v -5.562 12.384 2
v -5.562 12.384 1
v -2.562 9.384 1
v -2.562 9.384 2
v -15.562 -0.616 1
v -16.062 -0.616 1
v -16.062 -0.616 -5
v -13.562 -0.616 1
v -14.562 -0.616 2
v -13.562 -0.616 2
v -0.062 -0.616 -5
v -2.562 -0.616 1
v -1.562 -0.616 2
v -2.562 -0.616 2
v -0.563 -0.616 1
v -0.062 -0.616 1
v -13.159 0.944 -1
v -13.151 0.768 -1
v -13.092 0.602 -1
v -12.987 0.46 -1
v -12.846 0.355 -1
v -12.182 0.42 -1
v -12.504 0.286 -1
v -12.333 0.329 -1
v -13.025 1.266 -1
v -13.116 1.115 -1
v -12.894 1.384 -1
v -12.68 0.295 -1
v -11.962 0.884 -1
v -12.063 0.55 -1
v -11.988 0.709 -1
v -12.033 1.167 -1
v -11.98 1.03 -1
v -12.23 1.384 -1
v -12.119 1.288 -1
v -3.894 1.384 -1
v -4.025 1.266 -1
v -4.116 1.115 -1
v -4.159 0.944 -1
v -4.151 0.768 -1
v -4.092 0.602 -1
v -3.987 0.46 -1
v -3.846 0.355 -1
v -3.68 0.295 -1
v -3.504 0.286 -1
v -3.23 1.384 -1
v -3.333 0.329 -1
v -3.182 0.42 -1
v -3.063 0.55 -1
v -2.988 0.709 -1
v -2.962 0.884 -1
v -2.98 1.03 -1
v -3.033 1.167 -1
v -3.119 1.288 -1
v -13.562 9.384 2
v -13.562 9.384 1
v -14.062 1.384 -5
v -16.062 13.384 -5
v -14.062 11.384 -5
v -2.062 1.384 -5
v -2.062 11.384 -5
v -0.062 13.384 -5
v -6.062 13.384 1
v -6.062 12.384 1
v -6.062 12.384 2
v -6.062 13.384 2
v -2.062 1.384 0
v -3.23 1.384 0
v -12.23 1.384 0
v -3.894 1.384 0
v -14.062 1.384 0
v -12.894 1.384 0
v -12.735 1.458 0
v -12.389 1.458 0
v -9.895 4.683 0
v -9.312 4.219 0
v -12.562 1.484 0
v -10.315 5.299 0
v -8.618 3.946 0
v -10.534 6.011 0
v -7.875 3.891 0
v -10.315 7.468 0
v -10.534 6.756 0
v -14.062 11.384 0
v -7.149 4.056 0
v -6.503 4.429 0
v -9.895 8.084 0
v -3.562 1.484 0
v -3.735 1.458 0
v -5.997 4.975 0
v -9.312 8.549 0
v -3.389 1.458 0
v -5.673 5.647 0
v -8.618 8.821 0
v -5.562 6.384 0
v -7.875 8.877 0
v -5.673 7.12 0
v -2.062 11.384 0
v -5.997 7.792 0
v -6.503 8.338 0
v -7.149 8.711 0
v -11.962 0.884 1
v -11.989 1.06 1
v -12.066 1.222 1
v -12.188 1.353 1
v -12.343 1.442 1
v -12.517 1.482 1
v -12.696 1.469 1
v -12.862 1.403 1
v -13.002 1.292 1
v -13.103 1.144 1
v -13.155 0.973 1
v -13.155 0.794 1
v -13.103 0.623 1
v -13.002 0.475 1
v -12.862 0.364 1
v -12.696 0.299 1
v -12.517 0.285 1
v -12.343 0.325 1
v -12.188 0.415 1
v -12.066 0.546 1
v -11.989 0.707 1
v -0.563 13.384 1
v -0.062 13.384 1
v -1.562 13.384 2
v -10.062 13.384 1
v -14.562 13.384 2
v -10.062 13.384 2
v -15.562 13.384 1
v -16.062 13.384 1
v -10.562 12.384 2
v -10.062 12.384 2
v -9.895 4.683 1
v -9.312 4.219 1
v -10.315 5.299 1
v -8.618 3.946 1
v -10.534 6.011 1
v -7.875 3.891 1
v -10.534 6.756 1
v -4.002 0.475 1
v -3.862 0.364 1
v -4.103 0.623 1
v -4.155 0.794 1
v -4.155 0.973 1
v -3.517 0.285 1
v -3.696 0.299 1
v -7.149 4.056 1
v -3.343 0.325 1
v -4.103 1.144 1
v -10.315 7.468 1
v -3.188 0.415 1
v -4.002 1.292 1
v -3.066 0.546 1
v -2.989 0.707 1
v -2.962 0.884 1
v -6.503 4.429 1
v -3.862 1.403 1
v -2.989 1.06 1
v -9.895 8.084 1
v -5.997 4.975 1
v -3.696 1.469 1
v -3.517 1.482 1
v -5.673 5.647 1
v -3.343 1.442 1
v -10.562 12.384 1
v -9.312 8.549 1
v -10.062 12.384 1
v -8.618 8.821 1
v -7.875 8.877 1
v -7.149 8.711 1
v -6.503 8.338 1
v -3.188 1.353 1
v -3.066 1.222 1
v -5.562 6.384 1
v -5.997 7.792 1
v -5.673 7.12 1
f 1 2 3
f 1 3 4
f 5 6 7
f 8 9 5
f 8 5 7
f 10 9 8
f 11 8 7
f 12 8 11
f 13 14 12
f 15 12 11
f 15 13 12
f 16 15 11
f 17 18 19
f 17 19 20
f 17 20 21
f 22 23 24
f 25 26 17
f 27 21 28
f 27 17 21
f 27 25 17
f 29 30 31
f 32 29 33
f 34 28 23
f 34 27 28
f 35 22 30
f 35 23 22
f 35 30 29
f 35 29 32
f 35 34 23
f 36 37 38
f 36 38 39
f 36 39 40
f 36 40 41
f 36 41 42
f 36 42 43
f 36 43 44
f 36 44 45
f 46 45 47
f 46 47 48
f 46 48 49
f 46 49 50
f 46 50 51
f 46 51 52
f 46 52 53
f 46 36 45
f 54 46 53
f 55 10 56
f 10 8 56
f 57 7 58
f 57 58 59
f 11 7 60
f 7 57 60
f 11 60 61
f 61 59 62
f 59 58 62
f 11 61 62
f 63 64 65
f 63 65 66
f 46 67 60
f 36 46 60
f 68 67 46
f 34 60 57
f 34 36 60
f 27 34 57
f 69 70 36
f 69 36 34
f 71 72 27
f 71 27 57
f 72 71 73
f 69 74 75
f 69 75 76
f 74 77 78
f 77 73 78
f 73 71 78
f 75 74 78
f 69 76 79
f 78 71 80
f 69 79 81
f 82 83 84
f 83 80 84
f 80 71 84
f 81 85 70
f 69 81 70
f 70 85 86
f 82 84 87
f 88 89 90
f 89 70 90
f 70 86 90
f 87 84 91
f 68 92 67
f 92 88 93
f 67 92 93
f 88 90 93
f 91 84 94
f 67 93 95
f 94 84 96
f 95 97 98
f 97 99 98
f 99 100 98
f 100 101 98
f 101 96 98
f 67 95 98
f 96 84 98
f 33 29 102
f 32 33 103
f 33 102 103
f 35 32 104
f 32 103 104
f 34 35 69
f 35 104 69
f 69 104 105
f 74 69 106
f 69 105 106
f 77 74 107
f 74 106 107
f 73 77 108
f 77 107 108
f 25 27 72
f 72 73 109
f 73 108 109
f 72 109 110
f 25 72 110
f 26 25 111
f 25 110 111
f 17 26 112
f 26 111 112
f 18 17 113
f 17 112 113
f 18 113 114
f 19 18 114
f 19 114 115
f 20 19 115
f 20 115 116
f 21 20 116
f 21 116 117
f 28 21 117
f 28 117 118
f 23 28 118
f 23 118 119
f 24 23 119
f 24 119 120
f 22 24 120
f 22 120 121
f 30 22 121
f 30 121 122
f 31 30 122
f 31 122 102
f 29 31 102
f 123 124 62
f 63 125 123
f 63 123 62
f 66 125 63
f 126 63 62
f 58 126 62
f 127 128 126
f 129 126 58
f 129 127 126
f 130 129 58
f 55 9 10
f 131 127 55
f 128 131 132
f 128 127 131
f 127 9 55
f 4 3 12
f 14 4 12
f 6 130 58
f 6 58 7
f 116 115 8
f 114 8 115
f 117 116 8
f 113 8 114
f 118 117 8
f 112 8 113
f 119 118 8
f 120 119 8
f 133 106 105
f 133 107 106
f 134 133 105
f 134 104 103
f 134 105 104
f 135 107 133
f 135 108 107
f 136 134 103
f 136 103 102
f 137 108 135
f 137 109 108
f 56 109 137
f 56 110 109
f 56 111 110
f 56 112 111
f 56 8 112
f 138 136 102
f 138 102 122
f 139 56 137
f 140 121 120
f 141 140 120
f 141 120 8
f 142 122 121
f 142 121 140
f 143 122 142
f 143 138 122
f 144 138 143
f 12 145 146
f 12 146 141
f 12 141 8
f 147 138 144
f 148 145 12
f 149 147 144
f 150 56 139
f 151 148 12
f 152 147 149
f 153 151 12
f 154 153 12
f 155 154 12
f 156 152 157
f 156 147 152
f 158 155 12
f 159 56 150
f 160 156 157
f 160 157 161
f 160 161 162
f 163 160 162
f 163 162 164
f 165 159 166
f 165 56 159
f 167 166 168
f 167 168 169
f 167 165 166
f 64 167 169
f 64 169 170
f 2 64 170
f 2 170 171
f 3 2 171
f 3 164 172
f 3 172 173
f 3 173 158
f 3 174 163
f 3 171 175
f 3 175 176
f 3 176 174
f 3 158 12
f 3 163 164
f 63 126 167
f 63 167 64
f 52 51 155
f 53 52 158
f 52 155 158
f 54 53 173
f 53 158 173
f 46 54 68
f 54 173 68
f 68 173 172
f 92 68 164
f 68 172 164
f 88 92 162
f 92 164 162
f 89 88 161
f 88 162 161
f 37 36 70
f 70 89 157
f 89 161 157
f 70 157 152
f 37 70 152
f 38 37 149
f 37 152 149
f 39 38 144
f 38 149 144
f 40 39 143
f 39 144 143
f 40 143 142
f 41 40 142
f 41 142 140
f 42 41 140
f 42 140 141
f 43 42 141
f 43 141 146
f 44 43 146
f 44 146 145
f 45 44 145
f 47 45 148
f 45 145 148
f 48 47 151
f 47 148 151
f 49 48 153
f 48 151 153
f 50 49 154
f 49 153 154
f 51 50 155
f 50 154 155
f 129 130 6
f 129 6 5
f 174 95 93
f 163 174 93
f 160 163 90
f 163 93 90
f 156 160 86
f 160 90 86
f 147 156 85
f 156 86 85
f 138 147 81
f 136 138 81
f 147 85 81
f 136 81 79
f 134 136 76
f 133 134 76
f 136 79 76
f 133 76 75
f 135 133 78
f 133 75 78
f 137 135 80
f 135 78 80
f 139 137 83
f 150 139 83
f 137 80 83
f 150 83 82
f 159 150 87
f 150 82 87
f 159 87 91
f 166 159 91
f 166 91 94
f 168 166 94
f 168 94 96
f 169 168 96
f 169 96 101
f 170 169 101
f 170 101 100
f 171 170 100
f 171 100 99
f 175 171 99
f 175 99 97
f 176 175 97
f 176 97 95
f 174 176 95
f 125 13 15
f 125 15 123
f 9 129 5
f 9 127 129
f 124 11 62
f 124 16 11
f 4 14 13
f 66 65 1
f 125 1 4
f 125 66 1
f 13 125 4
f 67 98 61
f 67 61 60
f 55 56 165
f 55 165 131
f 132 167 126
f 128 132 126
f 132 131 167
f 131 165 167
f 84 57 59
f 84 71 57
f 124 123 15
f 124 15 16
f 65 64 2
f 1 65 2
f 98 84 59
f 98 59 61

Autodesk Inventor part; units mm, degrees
ref_plane "YZ Plane" through (0, 0, 0) normal (1, 0, 0) x (0, 1, 0)
ref_plane "XZ Plane" through (0, 0, 0) normal (0, 1, 0) x (-1, 0, 0)
ref_plane "XY Plane" through (0, 0, 0) normal (0, 0, 1) x (1, 0, 0)
sketch "Sketch1" plane through (0, 0, 0) normal (0, 0, 1) x (1, 0, 0)
  line L0 (-14.0621, 11.3836) -> (-2.0621, 11.3836)
  line L1 (-2.0621, 11.3836) -> (-2.0621, 1.3836)
  line L2 (-2.0621, 1.3836) -> (-14.0621, 1.3836)
  line L3 (-14.0621, 1.3836) -> (-14.0621, 11.3836)
  line L4 (-0.0621, 13.3836) -> (-16.0621, 13.3836)
  line L5 (-16.0621, 13.3836) -> (-16.0621, -0.6164)
  line L6 (-16.0621, -0.6164) -> (-0.0621, -0.6164)
  line L7 (-0.0621, -0.6164) -> (-0.0621, 13.3836)
  point P0 (0, 0)
  dimension "d0" = 12
  dimension "d1" = 10
  dimension "d2" = 2
extrude "Extrusion1" add sketch "Sketch1" against normal blind 5
sketch "Sketch2" plane through (0, 0, 0) normal (0, 0, 1) x (1, 0, 0)
  line L0 (-0.0621, 13.3836) -> (-16.0621, 13.3836) projected
  line L1 (-0.0621, -0.6164) -> (-0.0621, 13.3836) projected
  line L2 (-16.0621, 13.3836) -> (-0.0621, 13.3836)
  line L3 (-0.0621, 13.3836) -> (-0.0621, -0.6164)
  line L4 (-0.0621, -0.6164) -> (-16.0621, -0.6164)
  line L5 (-16.0621, -0.6164) -> (-16.0621, 13.3836)
  line L6 (-0.0621, 13.3836) -> (-0.0621, -0.6164) projected
  line L7 (-0.0621, 6.3836) -> (-16.0621, 6.3836)
  line L8 (-16.0621, -0.6164) -> (-16.0621, 13.3836) projected
  circle A0 centre (-8.0621, 6.3836) radius 2.5
  point P0 (0, 0)
  dimension "d7" = 5
extrude "Extrusion2" add sketch "Sketch2" along normal blind 1 contours L1 L7 A0 L5 L0 | L1 L4 L5 L7 A0
sketch "Sketch3" plane through (0, 0, 1) normal (0, 0, 1) x (1, 0, 0)
  line L0 (-13.5621, 12.3836) -> (-2.5621, 12.3836)
  line L1 (-2.5621, 12.3836) -> (-2.5621, 0.3836)
  line L2 (-2.5621, 0.3836) -> (-13.5621, 0.3836)
  line L3 (-13.5621, 0.3836) -> (-13.5621, 12.3836)
  line L4 (-8.0621, 12.3836) -> (-8.0621, 0.3836)
  circle A0 centre (-8.0621, 6.3836) radius 2.5 projected
  line L5 (-1.5621, 13.3836) -> (-14.5621, 13.3836)
  line L6 (-14.5621, 13.3836) -> (-14.5621, -0.6164)
  line L7 (-14.5621, -0.6164) -> (-1.5621, -0.6164)
  line L8 (-1.5621, -0.6164) -> (-1.5621, 13.3836)
  line L9 (-8.0621, 12.3836) -> (-10.0621, 12.3836)
  line L10 (-10.0621, 12.3836) -> (-10.0621, 13.3836)
  line L11 (-16.0621, 13.3836) -> (-0.0621, 13.3836) projected
  line L12 (-8.0621, 12.3836) -> (-6.0621, 12.3836)
  line L13 (-6.0621, 12.3836) -> (-6.0621, 13.3836)
  line L14 (-8.0621, 0.3836) -> (-4.0621, 0.3836)
  line L15 (-4.0621, 0.3836) -> (-4.0621, -0.6164)
  line L16 (-0.0621, -0.6164) -> (-16.0621, -0.6164) projected
  line L17 (-8.0621, 0.3836) -> (-12.0621, 0.3836)
  line L18 (-12.0621, 0.3836) -> (-12.0621, -0.6164)
  line L19 (-13.5621, 0.3836) -> (-13.5621, -0.6164)
  line L20 (-2.5621, 0.3836) -> (-2.5621, -0.6164)
  point P0 (0, 0)
  dimension "d8" = 11
  dimension "d9" = 12
  dimension "d10" = 1
  dimension "d11" = 2
  dimension "d12" = 2
  dimension "d13" = 4
  dimension "d14" = 4
extrude "Extrusion3" add sketch "Sketch3" along normal blind 1 contours L3 L19 L7 L6 L5 L10 L0 | L13 L5 L8 L7 L20 L1 L0
chamfer "Chamfer1" distance 1 angle 45 2 edges at (-14.5621, 6.3836, 1) (-1.5621, 6.3836, 1)
chamfer "Chamfer2" distance 3 angle 45 2 edges at (-13.5621, 12.3836, 1.5) (-2.5621, 12.3836, 1.5)
sketch "Sketch4" plane through (0, 0, 1) normal (0, 0, 1) x (1, 0, 0)
  circle A0 centre (-12.5621, 0.8836) radius 0.6
  circle A1 centre (-3.5621, 0.8836) radius 0.6
  line L0 (-12.5621, 0.8836) -> (-3.5621, 0.8836)
  circle A2 centre (-8.0621, 6.3836) radius 2.5 projected
  line L1 (-8.0621, 0.8836) -> (-8.0621, 6.3836)
  point P0 (0, 0)
  dimension "d23" = 1.2
  dimension "d24" = 1.2
  dimension "d25" = 5.5
  dimension "d26" = 9
extrude "Extrusion4" cut sketch "Sketch4" against normal blind 2 contours A0 | A1
properties part number "pid_test_structure"
